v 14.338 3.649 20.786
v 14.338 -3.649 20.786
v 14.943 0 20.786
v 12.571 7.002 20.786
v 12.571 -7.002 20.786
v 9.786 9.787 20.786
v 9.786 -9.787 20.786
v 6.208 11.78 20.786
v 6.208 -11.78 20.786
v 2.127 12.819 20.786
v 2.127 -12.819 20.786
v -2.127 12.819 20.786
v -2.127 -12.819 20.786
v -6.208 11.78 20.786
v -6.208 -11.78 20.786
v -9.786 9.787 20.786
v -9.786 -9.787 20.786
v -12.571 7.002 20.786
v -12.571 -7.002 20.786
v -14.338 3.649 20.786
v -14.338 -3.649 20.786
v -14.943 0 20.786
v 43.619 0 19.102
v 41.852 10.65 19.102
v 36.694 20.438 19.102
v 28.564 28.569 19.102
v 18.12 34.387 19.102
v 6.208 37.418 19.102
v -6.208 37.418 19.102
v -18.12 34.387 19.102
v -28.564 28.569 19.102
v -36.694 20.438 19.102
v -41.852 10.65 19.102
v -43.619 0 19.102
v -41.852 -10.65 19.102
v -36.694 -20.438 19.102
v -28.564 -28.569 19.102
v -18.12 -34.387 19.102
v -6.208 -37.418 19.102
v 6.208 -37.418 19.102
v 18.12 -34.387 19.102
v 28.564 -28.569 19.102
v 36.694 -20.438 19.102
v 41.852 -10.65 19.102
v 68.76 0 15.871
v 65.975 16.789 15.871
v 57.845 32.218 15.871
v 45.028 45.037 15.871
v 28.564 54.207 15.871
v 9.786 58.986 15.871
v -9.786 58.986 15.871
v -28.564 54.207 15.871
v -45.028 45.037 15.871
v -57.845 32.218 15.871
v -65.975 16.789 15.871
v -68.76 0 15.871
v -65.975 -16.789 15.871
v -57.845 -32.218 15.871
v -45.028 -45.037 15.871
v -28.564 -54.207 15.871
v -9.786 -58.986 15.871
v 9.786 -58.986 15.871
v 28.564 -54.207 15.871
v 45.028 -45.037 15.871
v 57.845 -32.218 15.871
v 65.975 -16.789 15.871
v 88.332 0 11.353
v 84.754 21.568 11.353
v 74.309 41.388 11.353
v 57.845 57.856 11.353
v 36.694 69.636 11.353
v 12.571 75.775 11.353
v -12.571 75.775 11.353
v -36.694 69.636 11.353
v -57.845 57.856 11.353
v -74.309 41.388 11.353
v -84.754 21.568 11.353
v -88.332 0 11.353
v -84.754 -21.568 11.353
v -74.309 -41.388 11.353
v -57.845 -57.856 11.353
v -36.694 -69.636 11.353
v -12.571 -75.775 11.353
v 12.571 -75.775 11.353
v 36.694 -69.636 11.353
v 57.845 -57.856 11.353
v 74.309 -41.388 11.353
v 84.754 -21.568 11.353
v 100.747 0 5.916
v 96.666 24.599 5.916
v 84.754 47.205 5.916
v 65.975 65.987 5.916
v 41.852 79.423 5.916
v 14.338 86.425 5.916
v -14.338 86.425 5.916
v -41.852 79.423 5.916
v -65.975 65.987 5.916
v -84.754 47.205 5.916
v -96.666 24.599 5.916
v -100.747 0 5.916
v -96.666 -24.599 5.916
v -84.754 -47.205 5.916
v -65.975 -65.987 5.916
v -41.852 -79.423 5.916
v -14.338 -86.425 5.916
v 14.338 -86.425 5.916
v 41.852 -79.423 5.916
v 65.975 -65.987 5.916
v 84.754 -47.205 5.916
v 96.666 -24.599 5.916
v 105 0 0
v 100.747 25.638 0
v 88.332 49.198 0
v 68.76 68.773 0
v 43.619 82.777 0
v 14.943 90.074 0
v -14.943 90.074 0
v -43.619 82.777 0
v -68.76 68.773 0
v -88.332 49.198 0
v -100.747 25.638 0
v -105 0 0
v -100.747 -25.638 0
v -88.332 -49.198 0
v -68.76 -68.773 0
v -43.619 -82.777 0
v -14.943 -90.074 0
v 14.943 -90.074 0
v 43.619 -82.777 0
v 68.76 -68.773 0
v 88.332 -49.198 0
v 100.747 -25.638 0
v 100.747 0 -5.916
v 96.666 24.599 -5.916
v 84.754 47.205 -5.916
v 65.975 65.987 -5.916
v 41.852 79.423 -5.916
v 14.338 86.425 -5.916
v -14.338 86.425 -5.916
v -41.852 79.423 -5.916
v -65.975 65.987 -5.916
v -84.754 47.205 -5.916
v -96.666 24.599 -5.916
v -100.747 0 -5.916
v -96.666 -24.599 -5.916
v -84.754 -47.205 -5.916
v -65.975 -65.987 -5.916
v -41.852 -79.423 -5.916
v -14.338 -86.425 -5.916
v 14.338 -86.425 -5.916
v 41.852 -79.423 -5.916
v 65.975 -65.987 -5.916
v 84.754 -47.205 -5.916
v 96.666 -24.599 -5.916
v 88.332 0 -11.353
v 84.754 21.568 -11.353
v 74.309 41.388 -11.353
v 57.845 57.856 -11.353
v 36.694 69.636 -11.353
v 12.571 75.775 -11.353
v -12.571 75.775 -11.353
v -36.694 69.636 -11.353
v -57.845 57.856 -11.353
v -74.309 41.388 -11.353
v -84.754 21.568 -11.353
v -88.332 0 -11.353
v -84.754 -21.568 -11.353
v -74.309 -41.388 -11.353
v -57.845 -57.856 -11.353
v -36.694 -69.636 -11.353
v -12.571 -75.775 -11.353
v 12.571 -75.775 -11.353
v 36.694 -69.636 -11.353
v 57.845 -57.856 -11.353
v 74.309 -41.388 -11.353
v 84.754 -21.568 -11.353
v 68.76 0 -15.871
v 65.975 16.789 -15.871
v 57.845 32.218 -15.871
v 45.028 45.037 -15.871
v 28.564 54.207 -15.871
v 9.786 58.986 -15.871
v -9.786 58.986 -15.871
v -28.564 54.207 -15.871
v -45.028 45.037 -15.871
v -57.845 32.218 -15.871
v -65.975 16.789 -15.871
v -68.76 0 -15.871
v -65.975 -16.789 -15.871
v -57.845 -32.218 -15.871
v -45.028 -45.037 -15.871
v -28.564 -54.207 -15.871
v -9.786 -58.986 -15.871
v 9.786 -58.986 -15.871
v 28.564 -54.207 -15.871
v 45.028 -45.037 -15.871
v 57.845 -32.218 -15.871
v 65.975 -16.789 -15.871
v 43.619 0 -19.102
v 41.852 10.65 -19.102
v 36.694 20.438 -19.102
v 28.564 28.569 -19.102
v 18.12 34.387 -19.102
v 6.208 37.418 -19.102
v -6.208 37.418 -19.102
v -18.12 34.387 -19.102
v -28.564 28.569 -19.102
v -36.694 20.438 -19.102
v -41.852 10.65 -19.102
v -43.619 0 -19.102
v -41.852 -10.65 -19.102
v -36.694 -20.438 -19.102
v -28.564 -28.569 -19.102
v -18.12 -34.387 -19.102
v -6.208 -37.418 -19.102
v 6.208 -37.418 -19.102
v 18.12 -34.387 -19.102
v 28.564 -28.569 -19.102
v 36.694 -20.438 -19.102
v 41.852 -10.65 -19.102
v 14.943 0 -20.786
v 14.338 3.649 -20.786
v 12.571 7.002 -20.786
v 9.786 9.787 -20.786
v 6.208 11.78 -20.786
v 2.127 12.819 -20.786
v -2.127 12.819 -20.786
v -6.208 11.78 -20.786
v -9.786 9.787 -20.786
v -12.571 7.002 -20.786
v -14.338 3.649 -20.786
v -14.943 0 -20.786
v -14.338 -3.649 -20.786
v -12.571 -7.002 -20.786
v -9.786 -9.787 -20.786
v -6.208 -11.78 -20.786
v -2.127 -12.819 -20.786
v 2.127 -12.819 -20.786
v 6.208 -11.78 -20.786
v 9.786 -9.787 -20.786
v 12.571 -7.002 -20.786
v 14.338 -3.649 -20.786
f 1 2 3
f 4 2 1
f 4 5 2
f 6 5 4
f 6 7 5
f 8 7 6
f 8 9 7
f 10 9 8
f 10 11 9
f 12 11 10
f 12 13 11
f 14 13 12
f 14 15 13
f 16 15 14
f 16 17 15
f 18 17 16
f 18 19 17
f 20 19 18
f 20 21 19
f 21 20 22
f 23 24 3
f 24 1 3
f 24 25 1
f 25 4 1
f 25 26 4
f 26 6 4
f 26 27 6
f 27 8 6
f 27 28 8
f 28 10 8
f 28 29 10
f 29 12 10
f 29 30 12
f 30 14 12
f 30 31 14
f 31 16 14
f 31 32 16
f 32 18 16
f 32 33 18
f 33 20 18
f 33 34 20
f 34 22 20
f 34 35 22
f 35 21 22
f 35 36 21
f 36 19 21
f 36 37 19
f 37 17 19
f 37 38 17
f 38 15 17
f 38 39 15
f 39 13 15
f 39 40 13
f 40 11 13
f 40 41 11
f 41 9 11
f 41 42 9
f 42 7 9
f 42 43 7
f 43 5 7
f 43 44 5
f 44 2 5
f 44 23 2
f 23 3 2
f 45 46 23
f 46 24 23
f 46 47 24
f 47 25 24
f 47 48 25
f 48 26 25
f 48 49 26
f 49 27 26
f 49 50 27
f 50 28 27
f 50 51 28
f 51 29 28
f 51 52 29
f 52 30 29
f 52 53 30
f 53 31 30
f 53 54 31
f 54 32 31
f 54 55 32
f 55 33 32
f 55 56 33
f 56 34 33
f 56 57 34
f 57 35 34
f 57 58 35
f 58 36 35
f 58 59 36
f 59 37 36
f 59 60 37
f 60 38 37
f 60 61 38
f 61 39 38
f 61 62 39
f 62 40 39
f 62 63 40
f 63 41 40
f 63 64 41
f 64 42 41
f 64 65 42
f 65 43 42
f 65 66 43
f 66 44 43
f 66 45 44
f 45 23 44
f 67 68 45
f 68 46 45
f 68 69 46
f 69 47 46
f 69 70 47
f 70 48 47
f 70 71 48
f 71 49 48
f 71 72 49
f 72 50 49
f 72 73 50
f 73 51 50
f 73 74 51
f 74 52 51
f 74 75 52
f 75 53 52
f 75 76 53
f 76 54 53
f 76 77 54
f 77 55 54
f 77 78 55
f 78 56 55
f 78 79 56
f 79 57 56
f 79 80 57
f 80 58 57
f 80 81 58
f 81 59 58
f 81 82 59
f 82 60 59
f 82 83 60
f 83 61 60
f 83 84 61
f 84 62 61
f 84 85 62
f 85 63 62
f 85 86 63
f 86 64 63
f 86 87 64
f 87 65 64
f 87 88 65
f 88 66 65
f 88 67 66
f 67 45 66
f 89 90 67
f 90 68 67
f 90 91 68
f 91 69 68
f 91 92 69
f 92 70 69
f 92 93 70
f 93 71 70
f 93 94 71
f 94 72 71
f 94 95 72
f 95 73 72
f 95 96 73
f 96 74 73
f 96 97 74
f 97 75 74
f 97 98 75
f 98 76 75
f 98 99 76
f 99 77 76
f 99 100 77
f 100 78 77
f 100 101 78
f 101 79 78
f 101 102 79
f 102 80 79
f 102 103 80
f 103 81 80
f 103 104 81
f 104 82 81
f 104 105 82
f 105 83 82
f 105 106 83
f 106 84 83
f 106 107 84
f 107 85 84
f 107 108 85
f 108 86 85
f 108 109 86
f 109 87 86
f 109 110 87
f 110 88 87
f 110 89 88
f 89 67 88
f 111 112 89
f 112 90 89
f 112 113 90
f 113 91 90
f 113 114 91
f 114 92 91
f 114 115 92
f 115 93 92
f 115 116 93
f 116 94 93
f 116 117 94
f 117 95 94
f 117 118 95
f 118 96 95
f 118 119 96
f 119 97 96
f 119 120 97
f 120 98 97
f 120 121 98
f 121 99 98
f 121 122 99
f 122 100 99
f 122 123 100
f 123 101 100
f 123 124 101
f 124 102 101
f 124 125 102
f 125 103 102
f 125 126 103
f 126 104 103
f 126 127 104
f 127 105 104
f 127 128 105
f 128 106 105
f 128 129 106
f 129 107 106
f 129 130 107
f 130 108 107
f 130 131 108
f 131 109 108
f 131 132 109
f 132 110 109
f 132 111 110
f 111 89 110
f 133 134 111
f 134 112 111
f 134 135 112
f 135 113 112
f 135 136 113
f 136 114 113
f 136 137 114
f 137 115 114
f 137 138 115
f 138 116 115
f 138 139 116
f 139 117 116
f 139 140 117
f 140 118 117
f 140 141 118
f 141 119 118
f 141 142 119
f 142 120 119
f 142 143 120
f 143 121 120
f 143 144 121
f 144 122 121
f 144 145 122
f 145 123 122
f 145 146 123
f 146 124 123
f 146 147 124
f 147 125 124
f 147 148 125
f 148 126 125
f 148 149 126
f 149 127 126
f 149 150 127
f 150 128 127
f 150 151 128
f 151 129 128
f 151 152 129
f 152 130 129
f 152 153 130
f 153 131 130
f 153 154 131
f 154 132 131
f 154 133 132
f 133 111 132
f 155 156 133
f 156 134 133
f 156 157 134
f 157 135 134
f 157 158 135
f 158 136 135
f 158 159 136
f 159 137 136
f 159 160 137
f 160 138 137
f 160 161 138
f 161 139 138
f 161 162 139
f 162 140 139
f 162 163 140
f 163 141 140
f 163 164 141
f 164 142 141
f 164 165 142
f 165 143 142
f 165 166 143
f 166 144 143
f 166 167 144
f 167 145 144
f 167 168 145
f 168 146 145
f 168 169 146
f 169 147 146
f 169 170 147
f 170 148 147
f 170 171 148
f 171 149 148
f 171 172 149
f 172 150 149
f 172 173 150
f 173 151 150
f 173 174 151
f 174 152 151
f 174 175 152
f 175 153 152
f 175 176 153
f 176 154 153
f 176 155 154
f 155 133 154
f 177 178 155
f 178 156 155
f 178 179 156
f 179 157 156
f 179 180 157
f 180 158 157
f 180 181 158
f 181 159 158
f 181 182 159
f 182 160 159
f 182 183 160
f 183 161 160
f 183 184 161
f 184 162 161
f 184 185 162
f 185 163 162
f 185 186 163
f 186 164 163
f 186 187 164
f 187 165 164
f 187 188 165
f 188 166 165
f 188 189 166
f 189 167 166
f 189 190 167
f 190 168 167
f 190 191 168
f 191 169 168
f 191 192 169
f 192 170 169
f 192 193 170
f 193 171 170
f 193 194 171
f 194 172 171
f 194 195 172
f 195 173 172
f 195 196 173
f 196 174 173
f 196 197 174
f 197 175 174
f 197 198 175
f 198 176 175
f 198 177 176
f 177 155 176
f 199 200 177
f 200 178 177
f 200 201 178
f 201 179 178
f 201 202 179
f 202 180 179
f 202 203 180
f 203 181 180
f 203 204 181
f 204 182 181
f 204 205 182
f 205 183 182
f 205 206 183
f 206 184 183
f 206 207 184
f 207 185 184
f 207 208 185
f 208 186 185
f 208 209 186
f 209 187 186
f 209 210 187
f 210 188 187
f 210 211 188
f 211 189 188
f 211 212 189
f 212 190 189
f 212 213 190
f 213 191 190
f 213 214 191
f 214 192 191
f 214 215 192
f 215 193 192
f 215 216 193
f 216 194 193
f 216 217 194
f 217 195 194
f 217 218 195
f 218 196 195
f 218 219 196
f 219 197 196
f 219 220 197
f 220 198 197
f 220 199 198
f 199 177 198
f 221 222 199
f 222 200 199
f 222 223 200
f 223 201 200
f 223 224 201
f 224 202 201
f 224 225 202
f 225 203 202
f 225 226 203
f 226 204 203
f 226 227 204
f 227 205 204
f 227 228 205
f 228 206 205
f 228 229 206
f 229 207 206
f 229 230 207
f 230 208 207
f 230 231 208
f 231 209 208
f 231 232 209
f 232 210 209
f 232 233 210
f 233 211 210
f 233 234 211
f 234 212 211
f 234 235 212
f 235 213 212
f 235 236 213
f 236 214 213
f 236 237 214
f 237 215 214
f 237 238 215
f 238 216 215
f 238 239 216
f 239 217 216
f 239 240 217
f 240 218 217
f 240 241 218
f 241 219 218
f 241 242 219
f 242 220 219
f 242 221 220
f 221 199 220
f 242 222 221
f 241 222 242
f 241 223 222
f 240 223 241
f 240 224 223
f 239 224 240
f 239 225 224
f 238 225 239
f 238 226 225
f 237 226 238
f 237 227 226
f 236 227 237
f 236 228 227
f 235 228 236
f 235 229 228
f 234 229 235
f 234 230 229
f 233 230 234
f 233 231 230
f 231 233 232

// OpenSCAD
// Generated by SolidPython 1.0.1 on 2020-07-29 00:46:52


scale(v = [15, 13, 3]) {
	sphere(r = 7);
}
/***********************************************
*********      SolidPython code:      **********
************************************************
 
# import packages: SolidPython
from solid import *
from solid.utils import *
from itertools import chain, combinations, permutations


class Resize:

    def __init__(self, scad_file):
        self.scad_file = scad_file
        #self.scad_file = import_scad(scad_file)
        # cone/cylinder param:
        self.r1 = 0
        self.r2 = 0
        self.h = 0
        # rectangular prism param:
        self.w = 0
        self.l = 0
        # ellipse param:
        self.r = 0

    # import OpenScad code (file name corresponds to shape)


    # classify shape + parameters
    def assign(self, param1, param2, param3):
        if self.scad_file == 'cone.scad':
            self.r1 = param1
            self.r2 = param2
            self.h = param3
        elif self.scad_file == 'cylinder.scad':
            self.r1 = param1
            self.r2 = param2
            self.h = param3
        elif self.scad_file == 'rectangularPrism.scad':
            self.h = param1
            self.l = param2
            self.w = param3
        else:
            self.r = param1
            self.h = param2

    # resize parameters
    def iterate(self):
        x = range(3, 20, 2)
        i = 1
        if self.scad_file == 'cone.scad':
            tempList = list(permutations(x, 2))
            for temp in tempList:
                param1 = temp[0]
                param2 = temp[1]
                filepath = 'produced_scad_files/' + 'cone' + str(param1) + '_' + str(param2) + '_' + '.scad'
                scad_render_to_file(cylinder(h=param1, r1=param2, r2=0), filepath)

        elif self.scad_file == 'cylinder.scad':
            tempList = list(permutations(x, 3))
            for temp in tempList:
                param1 = temp[0]
                param2 = temp[1]
                filepath = 'produced_scad_files/' + 'cylinder' + str(param1) + '_' + str(param2) + '_' + '.scad'
                scad_render_to_file(cylinder(h=param1, r1=param2, r2=param2), filepath)

        elif self.scad_file == 'rectangularPrism.scad':
            tempList = list(permutations(x, 3))
            for temp in tempList:
                param1 = temp[0]
                param2 = temp[1]
                param3 = temp[2]
                filepath = 'produced_scad_files/' + 'rectangularPrism' + str(param1) + '_' + str(param2) + '_' + str(
                    param3) + '.scad'
                scad_render_to_file(cube(size=(param1, param2, param3)), filepath)

        elif self.scad_file == 'ellipse.scad':
            tempList = list(permutations(x, 4))
            for temp in tempList:
                param1 = temp[0]
                param2 = temp[1]
                param3 = temp[2]
                param4 = temp[3]
                filepath = 'produced_scad_files/' + 'ellipse' + str(param1) + '_' + str(param2) + '_' + str(param3) + '_' + str(param4) + '.scad'
                scad_render_to_file(scale([param1, param2, param3])(sphere(r=param4)), filepath)

    def render_to_scadfile(self):
        scad_render_to_file(scad, 'example.scad') 
 
************************************************/
